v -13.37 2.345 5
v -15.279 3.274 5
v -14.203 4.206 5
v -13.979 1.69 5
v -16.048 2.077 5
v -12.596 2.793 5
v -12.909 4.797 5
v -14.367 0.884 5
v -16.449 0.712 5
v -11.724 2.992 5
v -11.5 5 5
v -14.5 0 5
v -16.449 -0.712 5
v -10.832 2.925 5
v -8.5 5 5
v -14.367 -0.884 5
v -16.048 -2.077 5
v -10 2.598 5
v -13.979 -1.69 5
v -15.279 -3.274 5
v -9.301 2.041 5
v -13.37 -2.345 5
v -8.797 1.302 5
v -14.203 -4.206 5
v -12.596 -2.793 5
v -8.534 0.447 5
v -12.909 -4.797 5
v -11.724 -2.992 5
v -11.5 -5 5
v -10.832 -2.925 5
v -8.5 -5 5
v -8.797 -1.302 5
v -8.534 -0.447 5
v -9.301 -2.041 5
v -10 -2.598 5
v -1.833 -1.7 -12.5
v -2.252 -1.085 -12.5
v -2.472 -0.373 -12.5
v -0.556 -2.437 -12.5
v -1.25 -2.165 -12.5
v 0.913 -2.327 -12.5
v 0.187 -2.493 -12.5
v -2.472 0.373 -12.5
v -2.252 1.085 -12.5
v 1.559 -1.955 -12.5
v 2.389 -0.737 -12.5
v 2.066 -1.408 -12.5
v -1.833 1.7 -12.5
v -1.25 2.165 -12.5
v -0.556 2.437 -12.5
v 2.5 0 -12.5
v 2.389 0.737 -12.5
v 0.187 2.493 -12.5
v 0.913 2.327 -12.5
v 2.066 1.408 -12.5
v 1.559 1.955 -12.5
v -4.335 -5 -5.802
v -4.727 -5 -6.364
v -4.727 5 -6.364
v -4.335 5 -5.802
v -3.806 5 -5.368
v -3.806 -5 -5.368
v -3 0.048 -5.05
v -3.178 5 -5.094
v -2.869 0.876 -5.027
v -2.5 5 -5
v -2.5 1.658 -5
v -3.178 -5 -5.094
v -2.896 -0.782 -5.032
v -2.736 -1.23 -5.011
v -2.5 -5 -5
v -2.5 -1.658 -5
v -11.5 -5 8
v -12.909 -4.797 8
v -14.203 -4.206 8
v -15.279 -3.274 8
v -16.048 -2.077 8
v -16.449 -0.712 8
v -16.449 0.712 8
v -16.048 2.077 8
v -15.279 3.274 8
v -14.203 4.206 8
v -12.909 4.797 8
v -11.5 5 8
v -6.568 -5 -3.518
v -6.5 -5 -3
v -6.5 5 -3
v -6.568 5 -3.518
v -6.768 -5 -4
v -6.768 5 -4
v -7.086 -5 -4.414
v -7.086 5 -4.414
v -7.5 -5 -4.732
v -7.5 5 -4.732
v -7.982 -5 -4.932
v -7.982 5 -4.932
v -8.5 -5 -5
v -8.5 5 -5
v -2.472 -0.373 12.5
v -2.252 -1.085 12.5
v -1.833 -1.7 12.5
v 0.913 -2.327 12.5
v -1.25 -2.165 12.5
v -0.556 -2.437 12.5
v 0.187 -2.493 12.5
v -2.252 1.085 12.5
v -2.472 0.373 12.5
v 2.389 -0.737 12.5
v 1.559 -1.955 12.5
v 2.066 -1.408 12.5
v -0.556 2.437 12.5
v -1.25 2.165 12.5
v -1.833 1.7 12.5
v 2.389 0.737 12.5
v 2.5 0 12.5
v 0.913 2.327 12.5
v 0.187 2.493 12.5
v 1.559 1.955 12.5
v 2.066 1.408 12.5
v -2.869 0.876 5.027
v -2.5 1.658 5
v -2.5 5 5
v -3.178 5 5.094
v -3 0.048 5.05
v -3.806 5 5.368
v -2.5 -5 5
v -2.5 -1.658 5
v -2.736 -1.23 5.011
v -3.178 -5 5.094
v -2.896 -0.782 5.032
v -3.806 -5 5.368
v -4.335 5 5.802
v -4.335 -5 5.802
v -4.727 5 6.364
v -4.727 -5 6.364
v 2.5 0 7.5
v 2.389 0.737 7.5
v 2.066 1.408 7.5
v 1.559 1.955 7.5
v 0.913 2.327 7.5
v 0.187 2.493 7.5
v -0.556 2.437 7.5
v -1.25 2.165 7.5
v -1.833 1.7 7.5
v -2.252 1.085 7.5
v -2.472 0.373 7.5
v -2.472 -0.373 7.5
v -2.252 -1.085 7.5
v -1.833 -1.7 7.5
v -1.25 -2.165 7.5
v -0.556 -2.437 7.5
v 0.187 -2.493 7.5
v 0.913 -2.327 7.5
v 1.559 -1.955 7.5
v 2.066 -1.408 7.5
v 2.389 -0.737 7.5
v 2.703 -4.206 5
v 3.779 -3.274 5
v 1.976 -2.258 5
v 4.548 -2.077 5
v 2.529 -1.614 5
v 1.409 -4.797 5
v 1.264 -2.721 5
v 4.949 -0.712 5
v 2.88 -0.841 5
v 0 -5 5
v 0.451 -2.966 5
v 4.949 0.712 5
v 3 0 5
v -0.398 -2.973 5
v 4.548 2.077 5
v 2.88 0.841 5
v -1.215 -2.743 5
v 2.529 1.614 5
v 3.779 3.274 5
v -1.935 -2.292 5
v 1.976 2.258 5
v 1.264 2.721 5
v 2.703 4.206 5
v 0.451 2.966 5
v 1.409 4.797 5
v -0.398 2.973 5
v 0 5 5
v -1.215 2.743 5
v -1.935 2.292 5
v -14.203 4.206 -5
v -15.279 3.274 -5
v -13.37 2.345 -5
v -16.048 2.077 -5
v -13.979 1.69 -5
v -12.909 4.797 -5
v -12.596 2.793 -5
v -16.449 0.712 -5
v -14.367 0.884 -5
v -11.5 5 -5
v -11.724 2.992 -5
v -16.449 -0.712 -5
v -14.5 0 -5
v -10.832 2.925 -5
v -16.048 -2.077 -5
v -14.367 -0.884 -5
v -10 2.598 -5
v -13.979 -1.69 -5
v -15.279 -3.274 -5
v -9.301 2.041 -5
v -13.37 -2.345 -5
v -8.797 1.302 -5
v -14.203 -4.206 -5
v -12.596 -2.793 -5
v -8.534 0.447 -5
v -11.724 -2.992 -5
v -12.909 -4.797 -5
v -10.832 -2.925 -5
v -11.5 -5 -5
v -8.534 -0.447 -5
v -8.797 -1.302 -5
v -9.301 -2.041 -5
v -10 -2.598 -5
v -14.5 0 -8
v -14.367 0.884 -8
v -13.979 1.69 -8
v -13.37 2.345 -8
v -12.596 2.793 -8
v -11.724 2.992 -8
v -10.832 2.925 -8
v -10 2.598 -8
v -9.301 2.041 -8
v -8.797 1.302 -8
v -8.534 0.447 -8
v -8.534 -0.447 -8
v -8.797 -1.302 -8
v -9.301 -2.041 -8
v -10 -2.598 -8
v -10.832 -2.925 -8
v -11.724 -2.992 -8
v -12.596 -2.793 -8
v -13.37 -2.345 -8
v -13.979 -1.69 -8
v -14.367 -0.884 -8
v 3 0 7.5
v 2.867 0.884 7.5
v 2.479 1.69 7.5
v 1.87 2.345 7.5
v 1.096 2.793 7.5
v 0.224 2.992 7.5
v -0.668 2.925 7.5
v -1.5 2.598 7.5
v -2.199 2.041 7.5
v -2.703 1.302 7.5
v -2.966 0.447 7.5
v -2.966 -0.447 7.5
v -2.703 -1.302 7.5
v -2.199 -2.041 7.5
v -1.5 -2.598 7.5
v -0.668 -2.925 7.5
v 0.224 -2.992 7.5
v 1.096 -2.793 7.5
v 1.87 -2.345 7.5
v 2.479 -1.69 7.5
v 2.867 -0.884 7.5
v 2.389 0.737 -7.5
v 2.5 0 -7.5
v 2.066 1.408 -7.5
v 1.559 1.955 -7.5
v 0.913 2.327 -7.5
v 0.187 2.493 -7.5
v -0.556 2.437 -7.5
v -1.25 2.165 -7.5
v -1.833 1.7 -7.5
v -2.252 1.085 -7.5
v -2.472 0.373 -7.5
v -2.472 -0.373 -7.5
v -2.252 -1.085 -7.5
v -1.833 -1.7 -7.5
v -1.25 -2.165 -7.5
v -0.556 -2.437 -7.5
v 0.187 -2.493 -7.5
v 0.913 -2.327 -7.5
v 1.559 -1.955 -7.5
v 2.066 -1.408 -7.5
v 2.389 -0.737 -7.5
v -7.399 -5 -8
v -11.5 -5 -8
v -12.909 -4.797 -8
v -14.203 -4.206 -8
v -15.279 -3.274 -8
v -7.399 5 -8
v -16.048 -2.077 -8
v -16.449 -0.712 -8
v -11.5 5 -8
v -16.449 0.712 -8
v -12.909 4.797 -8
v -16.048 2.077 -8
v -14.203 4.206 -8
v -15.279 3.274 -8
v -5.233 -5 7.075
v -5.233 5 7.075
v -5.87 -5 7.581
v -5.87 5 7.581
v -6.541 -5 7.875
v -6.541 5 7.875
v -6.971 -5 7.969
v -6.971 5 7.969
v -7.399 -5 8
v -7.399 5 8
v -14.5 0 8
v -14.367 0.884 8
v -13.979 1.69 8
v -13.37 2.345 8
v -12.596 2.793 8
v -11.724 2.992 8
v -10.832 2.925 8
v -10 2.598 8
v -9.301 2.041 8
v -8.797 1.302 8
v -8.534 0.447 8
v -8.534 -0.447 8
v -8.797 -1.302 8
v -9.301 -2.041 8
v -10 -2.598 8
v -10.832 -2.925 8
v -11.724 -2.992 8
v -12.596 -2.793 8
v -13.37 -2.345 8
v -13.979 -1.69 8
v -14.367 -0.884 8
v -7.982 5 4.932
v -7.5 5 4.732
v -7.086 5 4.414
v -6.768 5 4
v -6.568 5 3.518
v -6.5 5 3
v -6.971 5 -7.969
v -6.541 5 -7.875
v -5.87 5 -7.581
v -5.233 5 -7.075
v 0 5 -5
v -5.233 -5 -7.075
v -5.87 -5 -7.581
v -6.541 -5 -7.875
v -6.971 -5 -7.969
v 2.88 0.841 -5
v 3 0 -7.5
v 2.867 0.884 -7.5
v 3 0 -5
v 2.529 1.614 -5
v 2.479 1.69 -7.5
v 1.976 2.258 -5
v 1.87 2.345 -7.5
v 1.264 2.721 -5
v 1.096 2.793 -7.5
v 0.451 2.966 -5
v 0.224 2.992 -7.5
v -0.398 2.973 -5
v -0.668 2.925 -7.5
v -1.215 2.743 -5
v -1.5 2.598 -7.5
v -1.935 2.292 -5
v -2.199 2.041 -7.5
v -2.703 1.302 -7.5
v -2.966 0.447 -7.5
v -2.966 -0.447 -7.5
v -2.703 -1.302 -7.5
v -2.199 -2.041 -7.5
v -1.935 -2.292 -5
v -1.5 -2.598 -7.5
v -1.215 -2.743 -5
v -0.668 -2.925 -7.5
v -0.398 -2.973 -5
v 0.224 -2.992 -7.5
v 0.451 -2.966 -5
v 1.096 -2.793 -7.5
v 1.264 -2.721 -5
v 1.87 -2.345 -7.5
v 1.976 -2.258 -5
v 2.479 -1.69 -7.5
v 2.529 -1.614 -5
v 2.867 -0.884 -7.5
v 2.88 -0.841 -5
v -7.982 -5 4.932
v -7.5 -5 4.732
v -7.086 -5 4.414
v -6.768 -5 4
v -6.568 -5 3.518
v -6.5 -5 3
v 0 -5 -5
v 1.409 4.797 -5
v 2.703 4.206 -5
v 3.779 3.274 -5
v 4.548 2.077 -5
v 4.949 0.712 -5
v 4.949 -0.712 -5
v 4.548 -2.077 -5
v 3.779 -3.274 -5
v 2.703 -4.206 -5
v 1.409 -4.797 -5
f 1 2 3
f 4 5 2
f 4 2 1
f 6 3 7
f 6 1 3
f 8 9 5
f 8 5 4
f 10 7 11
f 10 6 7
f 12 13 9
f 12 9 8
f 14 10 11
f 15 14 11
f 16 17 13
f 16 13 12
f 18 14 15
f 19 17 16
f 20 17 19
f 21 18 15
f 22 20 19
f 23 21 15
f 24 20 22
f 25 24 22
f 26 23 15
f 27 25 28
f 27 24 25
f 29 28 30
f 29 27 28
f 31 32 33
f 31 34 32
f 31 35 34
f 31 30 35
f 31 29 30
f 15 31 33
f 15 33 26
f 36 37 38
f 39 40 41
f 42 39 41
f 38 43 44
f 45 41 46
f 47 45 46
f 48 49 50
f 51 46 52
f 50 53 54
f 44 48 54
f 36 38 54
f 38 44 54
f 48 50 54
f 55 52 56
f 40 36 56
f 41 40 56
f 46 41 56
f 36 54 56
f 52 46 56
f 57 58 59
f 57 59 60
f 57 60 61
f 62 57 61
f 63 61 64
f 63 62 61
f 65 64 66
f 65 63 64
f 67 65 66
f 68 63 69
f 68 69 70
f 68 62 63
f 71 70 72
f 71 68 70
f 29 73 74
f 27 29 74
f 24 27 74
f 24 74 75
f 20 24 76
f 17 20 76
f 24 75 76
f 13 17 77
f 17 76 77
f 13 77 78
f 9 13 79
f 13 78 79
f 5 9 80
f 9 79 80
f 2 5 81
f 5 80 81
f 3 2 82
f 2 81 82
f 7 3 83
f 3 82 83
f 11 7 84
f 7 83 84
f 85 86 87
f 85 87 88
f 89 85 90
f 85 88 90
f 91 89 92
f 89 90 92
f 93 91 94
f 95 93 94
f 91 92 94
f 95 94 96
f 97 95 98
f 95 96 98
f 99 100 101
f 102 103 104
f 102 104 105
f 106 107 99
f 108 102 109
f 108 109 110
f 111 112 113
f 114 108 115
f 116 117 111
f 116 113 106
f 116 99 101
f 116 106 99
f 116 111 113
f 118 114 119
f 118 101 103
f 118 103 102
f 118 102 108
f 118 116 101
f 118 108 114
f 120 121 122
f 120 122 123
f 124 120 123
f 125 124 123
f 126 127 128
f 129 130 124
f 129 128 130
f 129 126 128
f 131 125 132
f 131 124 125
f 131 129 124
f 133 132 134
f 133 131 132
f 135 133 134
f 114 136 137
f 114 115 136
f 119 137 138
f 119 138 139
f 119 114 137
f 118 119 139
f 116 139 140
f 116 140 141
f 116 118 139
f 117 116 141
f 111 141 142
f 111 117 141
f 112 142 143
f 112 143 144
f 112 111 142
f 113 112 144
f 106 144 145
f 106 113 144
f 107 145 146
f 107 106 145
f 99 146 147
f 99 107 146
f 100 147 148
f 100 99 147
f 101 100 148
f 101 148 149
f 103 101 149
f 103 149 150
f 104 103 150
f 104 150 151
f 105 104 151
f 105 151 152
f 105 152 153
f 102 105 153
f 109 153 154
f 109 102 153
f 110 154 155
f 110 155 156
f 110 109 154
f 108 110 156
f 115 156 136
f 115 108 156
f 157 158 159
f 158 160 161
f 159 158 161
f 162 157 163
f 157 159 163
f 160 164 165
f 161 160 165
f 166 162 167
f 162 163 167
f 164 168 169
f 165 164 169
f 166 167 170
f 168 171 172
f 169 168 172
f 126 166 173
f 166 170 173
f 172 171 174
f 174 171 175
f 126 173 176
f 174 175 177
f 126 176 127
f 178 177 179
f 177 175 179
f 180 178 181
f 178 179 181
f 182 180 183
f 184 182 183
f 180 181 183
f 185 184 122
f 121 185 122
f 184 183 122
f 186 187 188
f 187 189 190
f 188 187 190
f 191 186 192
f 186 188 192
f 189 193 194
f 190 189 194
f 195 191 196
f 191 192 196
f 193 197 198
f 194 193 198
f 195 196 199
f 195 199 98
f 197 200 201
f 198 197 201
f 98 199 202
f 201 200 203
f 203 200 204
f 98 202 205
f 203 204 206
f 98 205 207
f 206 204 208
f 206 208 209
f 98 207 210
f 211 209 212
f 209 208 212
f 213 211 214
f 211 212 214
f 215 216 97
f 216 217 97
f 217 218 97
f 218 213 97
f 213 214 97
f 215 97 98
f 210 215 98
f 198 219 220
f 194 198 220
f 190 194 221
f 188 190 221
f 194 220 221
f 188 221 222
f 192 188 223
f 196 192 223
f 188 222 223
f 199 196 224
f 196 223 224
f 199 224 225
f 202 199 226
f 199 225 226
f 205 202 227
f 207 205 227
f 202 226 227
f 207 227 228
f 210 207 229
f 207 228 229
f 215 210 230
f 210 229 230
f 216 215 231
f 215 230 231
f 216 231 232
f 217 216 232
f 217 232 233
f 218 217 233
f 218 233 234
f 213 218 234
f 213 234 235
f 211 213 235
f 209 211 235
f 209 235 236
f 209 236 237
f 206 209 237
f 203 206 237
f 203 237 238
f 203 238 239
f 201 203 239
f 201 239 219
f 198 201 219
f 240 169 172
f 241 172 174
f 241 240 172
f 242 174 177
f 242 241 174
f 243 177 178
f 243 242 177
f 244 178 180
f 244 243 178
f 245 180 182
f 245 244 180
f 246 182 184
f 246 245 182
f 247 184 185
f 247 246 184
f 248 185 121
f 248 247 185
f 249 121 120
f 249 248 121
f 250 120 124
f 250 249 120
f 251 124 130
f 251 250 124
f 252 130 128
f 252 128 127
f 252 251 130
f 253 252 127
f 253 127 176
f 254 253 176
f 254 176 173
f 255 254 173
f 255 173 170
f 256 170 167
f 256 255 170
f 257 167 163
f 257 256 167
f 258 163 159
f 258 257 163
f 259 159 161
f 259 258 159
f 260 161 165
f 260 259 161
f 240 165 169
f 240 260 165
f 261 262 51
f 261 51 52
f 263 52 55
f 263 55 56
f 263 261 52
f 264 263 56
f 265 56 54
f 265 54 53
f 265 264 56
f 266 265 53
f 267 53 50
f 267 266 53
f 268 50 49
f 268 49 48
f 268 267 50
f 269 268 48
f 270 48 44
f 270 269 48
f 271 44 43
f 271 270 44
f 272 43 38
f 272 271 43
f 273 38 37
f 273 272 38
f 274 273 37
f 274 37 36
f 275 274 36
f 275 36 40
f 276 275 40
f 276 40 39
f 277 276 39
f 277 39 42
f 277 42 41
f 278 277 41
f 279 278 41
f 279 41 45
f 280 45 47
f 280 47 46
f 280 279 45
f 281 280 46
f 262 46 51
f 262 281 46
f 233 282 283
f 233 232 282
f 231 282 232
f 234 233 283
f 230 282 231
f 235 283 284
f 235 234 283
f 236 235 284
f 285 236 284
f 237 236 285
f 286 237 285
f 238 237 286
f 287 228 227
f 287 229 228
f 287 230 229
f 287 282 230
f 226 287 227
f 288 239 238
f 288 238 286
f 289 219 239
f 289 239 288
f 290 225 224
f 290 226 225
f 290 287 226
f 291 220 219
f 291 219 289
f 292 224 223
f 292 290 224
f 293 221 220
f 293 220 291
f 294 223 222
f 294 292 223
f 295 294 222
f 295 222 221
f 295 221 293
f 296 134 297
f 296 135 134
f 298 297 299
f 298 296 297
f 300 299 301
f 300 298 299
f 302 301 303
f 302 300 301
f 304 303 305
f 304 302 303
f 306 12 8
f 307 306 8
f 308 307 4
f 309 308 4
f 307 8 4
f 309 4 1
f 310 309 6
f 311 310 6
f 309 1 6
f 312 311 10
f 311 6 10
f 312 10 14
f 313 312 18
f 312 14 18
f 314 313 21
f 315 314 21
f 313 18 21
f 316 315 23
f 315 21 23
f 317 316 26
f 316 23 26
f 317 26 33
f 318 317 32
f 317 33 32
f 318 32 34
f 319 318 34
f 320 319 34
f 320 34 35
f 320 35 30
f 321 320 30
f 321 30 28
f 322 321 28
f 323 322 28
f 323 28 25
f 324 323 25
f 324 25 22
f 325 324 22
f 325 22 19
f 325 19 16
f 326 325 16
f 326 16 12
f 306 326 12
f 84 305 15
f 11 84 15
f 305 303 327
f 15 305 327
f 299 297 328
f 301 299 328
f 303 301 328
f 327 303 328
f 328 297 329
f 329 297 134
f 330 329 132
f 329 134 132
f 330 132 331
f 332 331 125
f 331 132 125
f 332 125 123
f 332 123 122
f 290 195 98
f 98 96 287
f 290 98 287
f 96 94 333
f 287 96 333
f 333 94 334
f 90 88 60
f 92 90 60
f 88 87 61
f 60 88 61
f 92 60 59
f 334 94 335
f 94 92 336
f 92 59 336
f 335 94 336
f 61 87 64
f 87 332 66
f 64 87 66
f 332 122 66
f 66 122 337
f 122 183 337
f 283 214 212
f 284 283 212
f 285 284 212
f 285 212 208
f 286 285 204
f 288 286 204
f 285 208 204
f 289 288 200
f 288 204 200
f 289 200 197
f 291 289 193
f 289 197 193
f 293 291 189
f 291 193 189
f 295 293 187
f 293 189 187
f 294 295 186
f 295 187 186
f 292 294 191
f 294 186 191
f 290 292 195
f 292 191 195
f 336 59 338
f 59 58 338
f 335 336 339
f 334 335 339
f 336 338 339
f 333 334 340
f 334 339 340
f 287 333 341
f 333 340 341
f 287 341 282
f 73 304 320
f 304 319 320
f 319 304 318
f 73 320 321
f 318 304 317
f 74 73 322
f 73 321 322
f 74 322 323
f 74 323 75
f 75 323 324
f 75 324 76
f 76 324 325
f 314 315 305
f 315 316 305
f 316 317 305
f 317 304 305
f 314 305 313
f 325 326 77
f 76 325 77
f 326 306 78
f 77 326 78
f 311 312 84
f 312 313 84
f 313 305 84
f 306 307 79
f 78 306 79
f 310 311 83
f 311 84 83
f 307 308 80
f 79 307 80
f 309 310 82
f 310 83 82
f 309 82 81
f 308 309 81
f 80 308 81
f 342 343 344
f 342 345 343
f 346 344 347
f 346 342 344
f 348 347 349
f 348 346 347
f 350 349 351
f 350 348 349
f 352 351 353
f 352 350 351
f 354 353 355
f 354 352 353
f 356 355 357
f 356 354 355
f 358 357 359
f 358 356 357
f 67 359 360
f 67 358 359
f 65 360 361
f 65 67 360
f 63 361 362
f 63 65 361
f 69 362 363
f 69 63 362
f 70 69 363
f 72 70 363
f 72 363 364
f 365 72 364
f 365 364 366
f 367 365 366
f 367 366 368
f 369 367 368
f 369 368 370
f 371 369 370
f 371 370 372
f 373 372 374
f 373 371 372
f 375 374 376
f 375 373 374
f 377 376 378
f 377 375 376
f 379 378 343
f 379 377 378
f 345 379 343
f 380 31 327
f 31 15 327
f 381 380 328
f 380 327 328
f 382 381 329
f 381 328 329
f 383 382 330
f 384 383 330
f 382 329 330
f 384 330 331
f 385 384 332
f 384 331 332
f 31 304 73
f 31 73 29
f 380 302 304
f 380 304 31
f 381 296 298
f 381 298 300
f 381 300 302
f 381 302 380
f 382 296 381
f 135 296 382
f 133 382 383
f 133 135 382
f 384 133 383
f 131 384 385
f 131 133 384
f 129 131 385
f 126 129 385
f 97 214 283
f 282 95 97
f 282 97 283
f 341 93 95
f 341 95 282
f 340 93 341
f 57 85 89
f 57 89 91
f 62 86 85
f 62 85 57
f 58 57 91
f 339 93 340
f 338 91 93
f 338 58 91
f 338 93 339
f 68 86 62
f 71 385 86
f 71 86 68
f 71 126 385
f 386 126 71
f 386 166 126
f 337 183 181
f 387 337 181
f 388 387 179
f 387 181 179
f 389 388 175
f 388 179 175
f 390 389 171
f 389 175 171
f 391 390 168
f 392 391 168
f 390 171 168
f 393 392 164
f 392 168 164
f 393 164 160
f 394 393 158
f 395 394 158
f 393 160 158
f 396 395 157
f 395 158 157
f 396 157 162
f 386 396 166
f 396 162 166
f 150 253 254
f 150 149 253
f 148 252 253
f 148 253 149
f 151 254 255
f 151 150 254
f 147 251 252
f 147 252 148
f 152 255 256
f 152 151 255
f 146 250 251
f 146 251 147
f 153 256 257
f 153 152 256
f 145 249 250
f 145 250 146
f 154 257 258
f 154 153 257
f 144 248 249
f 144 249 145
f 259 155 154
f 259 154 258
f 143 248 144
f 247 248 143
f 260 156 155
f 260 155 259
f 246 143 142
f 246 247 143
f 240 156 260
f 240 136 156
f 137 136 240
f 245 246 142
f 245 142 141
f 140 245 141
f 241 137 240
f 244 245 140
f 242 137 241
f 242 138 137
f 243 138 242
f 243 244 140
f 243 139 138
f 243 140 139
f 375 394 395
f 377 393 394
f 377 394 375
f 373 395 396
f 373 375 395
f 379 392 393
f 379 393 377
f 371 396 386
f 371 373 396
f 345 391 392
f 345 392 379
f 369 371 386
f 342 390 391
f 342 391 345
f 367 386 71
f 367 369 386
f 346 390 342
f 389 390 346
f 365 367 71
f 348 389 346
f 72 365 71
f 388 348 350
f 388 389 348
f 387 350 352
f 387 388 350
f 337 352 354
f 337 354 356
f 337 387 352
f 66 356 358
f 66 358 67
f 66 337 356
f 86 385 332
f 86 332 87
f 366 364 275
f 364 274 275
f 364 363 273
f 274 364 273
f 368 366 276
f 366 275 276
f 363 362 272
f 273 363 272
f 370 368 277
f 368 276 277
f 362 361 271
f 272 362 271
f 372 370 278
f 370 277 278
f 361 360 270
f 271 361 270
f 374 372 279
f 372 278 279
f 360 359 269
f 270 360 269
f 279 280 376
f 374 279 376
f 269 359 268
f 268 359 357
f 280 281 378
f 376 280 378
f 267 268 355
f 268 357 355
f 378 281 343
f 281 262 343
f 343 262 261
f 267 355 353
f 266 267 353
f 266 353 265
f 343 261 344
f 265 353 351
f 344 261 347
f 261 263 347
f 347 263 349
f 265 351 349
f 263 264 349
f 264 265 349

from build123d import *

# Parameters (mm, degrees)
SKETCH1_R               = 3
BOSS_EXTRUDE1_DEPTH     = 5
SKETCH1_3_R             = 3
BOSS_EXTRUDE2_DEPTH     = 7.5
SKETCH1_4_R             = 2.5
BOSS_EXTRUDE3_DEPTH     = 12.5
BOSS_EXTRUDE4_DEPTH     = 8
CUT_EXTRUDE1_DEPTH      = 23.989127865
CUT_EXTRUDE1_DEPTH_BACK = 23.989127865
SKETCH6_W               = 10
SKETCH6_H               = 10
SKETCH7_R               = 3
CUT_EXTRUDE2_DEPTH      = 27.786190472
FILLET4_R               = 2.5
FILLET5_R               = 3
FILLET6_R               = 2


# Some blends are built 0.0001 mm under size
with BuildPart() as part:
    # Sketch1 → Boss-Extrude1 (new, symmetric)
    with BuildSketch(Plane.XY):
        with BuildLine():
            ThreePointArc((0, 5), (5, 0), (0, -5))
            Line((0, -5), (-5, -5))
            Line((-5, -5), (-5, 5))
            Line((-5, 5), (0, 5))
        make_face()
        Circle(SKETCH1_R, mode=Mode.SUBTRACT)
    extrude(amount=BOSS_EXTRUDE1_DEPTH, both=True)

    # Sketch1<3> → Boss-Extrude2 (add, symmetric)
    with BuildSketch(Plane.XY):
        Circle(SKETCH1_3_R)
    extrude(amount=BOSS_EXTRUDE2_DEPTH, both=True)

    # Sketch1<4> → Boss-Extrude3 (add, symmetric)
    with BuildSketch(Plane.XY):
        Circle(SKETCH1_4_R)
    extrude(amount=BOSS_EXTRUDE3_DEPTH, both=True)

    # Sketch5 → Boss-Extrude4 (add, symmetric)
    with BuildSketch(Plane.XY):
        with BuildLine():
            Line((-5, 5), (-5, -5))
            Line((-5, -5), (-11.5, -5))
            ThreePointArc((-11.5, -5), (-16.5, 0), (-11.5, 5))
            Line((-11.5, 5), (-5, 5))
        make_face()
    extrude(amount=BOSS_EXTRUDE4_DEPTH, both=True)

    # Sketch6 → Cut-Extrude1 (cut, two sides: drawn at the far end of the back side and taken through both)
    with BuildSketch(Plane(origin=(0, 5, 0), x_dir=(1, 0, 0), z_dir=(0, 1, 0)).offset(-CUT_EXTRUDE1_DEPTH_BACK)):
        with Locations((-11.5, 0)):
            Rectangle(SKETCH6_W, SKETCH6_H)
    extrude(amount=CUT_EXTRUDE1_DEPTH + CUT_EXTRUDE1_DEPTH_BACK, mode=Mode.SUBTRACT)

    # Sketch7 → Cut-Extrude2 (cut, through all)
    with BuildSketch(Plane(origin=(0, 0, -8), x_dir=(-1, 0, 0), z_dir=(0, 0, -1))):
        with Locations((11.5, 0)):
            Circle(SKETCH7_R)
    extrude(amount=-CUT_EXTRUDE2_DEPTH, mode=Mode.SUBTRACT)

    # Fillet4
    # the kernel refuses this fillet: 2.5 mm, written as the material it adds along each edge
    with BuildSketch(Plane(origin=(-5, -5, 5), x_dir=(0, 0, 1), z_dir=(0, 1, 0)), Plane(origin=(-5, -5, -5), x_dir=(1, 0, 0), z_dir=(0, 1, 0))) as fillet4_piece_1:
        with BuildLine():
            CenterArc((FILLET4_R, FILLET4_R), FILLET4_R, 180, 90)
            Line((0, FILLET4_R), (0, 0))
            Line((0, 0), (FILLET4_R, 0))
        make_face()
    extrude(amount=10)

    # Fillet5
    fillet5_edges = [part.edges().sort_by_distance(p)[0] for p in [
        (-5, 0, -8),
        (-5, 0, 8),
    ]]
    fillet(fillet5_edges, radius=FILLET5_R)

    # Fillet6
    fillet6_edges = [part.edges().sort_by_distance(p)[0] for p in [
        (-6.5, 0, -5),
        (-6.5, 0, 5),
    ]]
    fillet(fillet6_edges, radius=FILLET6_R - 0.0001)  # a hair under: the kernel refuses the full size


solid = part.part
